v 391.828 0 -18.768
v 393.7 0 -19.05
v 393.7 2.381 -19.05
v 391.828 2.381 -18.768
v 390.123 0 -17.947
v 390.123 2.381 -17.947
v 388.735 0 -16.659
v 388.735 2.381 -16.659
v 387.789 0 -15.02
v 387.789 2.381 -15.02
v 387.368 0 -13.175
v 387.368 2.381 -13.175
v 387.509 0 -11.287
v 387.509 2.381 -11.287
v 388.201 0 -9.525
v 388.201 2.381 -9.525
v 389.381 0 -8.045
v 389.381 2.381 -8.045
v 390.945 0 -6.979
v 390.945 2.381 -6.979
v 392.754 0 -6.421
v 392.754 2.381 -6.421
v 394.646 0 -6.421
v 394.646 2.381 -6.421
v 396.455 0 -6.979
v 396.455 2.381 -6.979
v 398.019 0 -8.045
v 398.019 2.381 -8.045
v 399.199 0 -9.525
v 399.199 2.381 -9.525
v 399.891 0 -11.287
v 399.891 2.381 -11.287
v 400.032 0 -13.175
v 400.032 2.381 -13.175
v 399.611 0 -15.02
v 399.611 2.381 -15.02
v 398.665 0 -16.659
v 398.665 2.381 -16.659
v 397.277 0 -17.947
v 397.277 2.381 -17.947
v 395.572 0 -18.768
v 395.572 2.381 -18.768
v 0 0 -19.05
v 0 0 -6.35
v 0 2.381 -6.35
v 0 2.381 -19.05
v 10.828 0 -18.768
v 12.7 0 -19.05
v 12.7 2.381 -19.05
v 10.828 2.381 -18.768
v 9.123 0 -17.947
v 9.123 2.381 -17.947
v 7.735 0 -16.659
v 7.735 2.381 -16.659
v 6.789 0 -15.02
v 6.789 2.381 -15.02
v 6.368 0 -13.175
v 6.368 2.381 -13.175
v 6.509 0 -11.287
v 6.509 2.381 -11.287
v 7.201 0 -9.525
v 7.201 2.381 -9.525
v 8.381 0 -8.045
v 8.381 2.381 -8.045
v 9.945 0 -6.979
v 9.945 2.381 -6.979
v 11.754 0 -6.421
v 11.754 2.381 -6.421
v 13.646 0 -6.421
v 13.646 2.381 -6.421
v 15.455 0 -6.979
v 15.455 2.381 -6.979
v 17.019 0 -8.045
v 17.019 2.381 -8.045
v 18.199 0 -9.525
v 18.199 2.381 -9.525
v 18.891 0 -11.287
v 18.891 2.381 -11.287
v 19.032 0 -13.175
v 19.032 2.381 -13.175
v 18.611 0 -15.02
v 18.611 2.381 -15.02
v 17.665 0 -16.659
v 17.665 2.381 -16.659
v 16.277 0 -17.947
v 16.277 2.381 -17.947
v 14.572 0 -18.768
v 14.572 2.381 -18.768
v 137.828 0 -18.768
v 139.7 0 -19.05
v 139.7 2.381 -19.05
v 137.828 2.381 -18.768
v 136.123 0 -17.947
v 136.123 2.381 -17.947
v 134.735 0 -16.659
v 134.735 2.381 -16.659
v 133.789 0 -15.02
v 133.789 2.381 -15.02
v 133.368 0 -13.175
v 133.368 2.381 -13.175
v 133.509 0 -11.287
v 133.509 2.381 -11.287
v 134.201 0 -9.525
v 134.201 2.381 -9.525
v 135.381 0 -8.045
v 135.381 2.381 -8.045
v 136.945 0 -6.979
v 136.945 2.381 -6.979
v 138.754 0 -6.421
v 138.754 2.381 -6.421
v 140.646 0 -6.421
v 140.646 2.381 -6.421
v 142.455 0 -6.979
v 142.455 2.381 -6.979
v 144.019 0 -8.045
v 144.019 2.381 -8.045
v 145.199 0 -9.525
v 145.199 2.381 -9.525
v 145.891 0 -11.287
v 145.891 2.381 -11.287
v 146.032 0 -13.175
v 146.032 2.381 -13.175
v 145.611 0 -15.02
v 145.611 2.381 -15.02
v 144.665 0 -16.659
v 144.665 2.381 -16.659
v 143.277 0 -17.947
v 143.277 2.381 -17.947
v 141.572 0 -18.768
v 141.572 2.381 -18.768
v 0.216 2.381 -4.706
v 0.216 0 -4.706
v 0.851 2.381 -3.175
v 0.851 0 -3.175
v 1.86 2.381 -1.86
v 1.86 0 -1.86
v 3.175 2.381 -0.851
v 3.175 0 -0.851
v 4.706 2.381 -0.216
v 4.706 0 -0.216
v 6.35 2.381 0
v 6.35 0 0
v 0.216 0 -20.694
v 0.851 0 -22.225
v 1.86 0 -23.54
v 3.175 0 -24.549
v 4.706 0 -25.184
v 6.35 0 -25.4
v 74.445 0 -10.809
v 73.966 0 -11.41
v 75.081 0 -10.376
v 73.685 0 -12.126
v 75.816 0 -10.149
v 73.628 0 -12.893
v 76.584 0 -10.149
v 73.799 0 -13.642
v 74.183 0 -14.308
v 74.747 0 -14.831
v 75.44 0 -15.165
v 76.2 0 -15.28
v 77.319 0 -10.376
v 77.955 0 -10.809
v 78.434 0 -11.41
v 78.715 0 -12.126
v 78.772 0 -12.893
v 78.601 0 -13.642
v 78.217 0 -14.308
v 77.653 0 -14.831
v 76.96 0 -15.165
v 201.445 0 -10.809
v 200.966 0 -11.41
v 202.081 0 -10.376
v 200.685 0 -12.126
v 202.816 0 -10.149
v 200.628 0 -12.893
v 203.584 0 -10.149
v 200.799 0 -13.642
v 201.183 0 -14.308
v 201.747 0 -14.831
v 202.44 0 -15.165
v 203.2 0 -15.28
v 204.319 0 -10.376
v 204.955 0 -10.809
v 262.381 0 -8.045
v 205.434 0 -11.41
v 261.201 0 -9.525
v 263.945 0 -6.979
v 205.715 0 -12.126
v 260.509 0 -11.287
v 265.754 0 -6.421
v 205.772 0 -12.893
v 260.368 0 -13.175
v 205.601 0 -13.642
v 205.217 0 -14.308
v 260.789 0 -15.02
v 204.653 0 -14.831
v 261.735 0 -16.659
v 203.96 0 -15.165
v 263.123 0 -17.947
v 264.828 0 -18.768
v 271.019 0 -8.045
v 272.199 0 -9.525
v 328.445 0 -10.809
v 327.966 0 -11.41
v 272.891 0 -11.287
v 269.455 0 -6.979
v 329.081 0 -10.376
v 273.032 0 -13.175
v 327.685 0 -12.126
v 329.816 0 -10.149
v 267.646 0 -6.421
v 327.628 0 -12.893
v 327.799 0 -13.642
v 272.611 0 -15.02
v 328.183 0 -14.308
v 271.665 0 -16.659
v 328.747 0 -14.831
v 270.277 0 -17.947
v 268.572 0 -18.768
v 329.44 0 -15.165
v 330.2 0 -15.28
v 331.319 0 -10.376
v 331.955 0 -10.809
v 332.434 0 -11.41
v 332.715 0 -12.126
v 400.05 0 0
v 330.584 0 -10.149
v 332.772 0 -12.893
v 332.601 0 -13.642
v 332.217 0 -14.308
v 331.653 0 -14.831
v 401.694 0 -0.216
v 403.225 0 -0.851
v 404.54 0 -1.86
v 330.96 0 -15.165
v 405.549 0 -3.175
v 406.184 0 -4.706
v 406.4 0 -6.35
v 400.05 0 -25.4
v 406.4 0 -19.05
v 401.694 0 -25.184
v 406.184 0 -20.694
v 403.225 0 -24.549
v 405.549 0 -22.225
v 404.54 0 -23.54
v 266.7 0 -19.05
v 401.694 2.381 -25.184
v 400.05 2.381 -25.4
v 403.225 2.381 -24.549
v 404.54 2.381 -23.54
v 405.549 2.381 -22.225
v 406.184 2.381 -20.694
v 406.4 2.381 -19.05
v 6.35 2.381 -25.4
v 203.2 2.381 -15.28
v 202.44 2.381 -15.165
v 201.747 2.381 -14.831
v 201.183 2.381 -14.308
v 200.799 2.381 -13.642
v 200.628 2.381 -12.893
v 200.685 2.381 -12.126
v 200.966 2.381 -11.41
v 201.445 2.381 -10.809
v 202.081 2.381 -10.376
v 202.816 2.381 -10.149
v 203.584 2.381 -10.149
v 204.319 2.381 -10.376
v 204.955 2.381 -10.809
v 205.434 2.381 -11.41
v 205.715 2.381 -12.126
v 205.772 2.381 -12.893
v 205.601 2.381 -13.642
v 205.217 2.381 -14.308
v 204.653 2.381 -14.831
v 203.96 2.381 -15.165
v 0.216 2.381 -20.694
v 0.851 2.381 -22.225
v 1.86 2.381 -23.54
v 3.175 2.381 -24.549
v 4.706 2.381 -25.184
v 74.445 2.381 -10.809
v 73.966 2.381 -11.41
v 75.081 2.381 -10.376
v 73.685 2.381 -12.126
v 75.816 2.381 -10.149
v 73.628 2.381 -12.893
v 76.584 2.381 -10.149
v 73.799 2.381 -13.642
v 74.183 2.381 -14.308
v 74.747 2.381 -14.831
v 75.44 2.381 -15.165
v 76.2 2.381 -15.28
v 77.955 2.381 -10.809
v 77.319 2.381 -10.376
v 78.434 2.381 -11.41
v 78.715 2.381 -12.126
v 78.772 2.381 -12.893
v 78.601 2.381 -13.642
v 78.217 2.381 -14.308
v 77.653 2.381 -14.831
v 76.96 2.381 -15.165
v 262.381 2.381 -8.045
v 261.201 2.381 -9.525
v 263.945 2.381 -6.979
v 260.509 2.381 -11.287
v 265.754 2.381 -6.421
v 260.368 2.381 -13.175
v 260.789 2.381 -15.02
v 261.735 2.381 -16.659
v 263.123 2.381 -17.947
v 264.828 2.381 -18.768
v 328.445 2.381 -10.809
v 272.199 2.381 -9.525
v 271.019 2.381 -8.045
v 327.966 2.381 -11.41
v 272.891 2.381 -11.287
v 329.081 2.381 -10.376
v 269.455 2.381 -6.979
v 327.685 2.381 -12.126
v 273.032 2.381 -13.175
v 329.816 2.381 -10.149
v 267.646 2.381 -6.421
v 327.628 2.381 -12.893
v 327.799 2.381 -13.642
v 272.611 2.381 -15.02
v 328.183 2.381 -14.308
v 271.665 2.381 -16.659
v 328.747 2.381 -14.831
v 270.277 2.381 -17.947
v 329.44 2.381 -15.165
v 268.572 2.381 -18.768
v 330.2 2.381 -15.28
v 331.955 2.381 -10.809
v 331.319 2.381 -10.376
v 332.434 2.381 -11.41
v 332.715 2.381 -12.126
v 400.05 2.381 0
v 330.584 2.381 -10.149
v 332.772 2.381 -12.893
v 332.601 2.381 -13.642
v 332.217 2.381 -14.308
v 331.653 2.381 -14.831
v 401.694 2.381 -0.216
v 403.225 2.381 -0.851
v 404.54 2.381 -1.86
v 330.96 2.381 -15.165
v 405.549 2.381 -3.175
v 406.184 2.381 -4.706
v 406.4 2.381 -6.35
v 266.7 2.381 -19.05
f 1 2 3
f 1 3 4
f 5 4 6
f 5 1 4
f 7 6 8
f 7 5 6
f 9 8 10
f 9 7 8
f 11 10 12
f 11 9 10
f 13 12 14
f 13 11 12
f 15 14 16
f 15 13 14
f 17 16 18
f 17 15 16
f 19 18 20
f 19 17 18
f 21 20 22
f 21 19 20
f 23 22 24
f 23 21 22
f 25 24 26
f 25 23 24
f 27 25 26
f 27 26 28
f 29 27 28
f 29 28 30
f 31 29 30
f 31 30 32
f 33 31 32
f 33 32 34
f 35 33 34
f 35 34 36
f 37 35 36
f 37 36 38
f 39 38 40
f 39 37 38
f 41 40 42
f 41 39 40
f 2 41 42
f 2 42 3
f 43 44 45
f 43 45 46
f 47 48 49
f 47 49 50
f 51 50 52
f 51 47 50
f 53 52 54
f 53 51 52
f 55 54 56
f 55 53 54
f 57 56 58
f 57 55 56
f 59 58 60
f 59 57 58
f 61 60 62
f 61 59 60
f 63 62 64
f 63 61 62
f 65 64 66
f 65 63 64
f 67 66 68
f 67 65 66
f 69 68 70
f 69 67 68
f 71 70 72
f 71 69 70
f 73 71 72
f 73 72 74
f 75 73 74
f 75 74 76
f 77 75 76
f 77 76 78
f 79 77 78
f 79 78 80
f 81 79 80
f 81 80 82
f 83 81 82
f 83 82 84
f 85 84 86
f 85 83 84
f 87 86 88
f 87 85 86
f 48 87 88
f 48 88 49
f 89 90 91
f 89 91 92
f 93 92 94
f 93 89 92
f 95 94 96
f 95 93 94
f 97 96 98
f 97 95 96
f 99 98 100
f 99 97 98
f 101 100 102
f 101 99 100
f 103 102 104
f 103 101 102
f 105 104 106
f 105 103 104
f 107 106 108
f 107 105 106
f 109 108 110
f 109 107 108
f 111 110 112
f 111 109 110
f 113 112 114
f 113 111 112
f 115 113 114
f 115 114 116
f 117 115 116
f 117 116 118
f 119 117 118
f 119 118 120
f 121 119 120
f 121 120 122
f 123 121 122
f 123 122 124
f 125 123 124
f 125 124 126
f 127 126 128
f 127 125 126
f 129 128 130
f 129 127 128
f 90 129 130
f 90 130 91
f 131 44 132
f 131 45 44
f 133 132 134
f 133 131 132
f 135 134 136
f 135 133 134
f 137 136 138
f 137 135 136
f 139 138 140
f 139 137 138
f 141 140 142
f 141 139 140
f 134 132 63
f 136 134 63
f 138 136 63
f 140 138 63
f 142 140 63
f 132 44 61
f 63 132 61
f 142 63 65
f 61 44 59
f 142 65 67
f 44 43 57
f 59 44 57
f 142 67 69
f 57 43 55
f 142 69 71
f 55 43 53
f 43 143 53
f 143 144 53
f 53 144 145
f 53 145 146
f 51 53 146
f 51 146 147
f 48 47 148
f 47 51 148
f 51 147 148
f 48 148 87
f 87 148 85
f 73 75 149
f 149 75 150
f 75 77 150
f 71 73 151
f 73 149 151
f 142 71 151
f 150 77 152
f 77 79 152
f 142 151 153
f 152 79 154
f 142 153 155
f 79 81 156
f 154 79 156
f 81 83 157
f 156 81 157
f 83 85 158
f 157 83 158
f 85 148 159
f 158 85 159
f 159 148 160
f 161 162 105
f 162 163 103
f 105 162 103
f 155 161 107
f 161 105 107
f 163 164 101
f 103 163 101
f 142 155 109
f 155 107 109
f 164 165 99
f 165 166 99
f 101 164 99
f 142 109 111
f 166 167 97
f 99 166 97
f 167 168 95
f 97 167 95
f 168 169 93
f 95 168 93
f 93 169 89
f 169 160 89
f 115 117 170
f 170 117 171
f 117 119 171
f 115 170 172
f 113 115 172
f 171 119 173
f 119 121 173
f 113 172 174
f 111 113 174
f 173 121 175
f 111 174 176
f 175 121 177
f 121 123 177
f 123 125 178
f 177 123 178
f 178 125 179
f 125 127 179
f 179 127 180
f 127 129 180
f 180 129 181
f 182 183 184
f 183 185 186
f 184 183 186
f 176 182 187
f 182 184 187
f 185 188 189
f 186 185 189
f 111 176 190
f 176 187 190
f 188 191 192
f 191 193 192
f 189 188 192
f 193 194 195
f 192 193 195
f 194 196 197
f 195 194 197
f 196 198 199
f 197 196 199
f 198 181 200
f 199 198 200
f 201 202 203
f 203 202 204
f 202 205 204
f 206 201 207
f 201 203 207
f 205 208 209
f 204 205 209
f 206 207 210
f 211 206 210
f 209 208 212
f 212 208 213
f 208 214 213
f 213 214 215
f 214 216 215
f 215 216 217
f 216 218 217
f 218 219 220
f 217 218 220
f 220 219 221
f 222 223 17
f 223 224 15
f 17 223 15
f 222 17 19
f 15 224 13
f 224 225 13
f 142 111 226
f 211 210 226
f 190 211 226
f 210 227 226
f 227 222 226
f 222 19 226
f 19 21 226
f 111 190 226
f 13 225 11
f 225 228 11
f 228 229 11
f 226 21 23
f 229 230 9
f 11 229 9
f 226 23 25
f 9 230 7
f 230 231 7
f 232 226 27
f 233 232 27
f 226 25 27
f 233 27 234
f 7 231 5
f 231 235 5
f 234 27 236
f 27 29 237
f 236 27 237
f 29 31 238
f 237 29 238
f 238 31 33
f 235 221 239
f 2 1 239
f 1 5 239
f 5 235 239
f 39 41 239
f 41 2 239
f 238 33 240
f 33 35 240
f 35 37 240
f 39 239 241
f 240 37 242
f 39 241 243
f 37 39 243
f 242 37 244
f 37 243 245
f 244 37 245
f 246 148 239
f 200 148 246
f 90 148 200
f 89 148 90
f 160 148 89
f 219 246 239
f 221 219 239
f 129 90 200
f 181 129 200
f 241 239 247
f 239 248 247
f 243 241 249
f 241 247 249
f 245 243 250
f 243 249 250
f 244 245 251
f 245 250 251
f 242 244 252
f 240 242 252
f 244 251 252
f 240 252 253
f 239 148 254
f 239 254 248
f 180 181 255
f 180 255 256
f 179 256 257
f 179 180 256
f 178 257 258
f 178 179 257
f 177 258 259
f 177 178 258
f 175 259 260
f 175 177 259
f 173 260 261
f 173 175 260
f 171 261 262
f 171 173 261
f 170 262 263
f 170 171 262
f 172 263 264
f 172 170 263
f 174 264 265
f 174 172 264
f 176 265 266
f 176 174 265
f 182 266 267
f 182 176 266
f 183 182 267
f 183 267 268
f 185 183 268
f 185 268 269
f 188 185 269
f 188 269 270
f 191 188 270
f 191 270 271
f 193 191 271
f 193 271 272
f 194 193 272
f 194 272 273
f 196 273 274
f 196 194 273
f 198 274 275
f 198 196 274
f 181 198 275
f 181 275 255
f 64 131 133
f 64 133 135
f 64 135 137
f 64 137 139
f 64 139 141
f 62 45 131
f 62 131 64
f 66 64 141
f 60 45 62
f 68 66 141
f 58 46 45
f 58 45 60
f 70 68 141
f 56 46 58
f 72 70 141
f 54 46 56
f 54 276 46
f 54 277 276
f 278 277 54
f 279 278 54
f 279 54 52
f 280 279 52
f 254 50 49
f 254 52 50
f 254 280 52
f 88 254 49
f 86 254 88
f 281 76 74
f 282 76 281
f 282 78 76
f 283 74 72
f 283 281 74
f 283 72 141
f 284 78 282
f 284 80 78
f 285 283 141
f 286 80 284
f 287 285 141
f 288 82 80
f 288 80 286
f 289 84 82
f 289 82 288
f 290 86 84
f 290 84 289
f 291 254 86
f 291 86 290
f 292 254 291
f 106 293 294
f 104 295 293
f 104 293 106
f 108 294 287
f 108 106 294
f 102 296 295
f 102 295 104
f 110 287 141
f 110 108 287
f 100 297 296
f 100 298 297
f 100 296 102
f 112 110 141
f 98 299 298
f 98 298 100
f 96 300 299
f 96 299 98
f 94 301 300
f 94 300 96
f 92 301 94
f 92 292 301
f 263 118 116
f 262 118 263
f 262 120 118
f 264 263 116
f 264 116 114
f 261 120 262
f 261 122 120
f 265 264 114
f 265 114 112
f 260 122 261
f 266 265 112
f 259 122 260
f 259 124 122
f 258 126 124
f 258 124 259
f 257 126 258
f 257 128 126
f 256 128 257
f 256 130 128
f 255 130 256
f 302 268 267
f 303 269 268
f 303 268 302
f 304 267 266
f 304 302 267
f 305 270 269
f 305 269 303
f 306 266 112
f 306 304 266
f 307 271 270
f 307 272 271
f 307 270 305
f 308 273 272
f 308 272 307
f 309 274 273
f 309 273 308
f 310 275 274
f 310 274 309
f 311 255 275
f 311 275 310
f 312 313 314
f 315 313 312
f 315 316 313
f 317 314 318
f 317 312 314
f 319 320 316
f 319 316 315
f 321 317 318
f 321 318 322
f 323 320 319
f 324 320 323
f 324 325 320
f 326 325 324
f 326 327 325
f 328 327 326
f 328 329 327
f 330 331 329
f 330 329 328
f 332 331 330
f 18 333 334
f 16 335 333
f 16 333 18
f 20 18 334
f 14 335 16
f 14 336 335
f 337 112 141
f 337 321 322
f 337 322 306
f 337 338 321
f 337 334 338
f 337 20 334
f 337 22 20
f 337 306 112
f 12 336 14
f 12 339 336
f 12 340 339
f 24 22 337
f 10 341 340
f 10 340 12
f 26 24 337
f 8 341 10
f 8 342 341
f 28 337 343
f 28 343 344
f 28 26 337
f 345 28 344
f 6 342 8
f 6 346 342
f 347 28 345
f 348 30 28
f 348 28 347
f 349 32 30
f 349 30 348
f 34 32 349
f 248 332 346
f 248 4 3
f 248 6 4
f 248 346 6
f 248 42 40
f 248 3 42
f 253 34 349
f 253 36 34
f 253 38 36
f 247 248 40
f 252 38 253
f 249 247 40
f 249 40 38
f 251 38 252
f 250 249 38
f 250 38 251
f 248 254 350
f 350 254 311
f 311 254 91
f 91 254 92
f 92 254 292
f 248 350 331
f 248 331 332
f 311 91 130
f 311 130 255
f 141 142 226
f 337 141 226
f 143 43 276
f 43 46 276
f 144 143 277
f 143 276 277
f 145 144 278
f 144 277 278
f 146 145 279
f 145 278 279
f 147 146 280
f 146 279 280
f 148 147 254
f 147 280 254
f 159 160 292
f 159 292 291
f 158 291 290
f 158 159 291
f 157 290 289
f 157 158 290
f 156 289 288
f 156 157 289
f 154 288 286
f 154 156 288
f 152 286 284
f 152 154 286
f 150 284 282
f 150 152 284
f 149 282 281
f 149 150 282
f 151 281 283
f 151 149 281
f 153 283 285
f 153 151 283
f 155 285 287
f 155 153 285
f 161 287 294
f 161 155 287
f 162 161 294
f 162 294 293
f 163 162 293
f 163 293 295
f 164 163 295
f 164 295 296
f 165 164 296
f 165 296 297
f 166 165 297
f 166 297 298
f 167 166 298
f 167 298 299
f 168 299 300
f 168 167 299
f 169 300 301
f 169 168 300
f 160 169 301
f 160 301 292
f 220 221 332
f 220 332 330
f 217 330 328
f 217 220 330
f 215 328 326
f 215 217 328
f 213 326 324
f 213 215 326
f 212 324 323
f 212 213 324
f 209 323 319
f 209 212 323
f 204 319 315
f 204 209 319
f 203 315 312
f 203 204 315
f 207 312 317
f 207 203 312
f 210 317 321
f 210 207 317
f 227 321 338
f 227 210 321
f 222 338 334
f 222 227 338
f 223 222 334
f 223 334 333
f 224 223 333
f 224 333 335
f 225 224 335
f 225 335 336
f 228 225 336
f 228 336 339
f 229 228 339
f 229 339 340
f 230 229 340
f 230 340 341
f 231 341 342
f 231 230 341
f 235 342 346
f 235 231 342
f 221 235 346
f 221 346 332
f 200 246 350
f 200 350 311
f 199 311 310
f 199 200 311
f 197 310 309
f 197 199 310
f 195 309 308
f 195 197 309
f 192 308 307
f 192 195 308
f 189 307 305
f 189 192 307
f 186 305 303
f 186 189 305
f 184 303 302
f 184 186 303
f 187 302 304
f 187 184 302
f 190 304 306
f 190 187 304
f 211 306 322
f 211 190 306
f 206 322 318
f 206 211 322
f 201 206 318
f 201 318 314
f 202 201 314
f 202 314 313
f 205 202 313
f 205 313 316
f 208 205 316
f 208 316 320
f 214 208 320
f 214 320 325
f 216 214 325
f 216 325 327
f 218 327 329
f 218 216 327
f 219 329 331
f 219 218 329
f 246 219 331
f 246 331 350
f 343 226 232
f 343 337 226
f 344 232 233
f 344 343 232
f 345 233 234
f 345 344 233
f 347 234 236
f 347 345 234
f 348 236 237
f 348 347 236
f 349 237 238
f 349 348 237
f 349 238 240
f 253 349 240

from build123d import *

# Parameters (mm, degrees)
SKETCH1_W           = 406.4
SKETCH1_H           = 25.4
SKETCH1_R           = 6.35
SKETCH1_R_2         = 2.5796875
BOSS_EXTRUDE1_DEPTH = 2.38125
FILLET1_R           = 6.35


with BuildPart() as part:
    # Sketch1 → Boss-Extrude1 (new body)
    with BuildSketch(Plane(origin=(0, 0, 0), x_dir=(1, 0, 0), z_dir=(0, 1, 0))):
        with Locations((203.2, 12.7)):
            Rectangle(SKETCH1_W, SKETCH1_H)
        with Locations(Location((12.7, 12.7, 0), (0, 0, 90))):
            Circle(SKETCH1_R, mode=Mode.SUBTRACT)
        with Locations(Location((393.7, 12.7, 0), (0, 0, 90))):
            Circle(SKETCH1_R, mode=Mode.SUBTRACT)
        with Locations(Location((139.7, 12.7, 0), (0, 0, 90))):
            Circle(SKETCH1_R, mode=Mode.SUBTRACT)
        with Locations(Location((266.7, 12.7, 0), (0, 0, 90))):
            Circle(SKETCH1_R, mode=Mode.SUBTRACT)
        with Locations(Location((76.2, 12.7, 0), (0, 0, 90))):
            Circle(SKETCH1_R_2, mode=Mode.SUBTRACT)
        with Locations(Location((203.2, 12.7, 0), (0, 0, 90))):
            Circle(SKETCH1_R_2, mode=Mode.SUBTRACT)
        with Locations(Location((330.2, 12.7, 0), (0, 0, 90))):
            Circle(SKETCH1_R_2, mode=Mode.SUBTRACT)
    extrude(amount=BOSS_EXTRUDE1_DEPTH)

    # Fillet1
    fillet1_edges = [part.edges().sort_by_distance(p)[0] for p in [
        (0, 1.190625, -25.4),
        (406.4, 1.190625, -25.4),
        (406.4, 1.190625, 0),
        (0, 1.190625, 0),
    ]]
    fillet(fillet1_edges, radius=FILLET1_R)


solid = part.part
